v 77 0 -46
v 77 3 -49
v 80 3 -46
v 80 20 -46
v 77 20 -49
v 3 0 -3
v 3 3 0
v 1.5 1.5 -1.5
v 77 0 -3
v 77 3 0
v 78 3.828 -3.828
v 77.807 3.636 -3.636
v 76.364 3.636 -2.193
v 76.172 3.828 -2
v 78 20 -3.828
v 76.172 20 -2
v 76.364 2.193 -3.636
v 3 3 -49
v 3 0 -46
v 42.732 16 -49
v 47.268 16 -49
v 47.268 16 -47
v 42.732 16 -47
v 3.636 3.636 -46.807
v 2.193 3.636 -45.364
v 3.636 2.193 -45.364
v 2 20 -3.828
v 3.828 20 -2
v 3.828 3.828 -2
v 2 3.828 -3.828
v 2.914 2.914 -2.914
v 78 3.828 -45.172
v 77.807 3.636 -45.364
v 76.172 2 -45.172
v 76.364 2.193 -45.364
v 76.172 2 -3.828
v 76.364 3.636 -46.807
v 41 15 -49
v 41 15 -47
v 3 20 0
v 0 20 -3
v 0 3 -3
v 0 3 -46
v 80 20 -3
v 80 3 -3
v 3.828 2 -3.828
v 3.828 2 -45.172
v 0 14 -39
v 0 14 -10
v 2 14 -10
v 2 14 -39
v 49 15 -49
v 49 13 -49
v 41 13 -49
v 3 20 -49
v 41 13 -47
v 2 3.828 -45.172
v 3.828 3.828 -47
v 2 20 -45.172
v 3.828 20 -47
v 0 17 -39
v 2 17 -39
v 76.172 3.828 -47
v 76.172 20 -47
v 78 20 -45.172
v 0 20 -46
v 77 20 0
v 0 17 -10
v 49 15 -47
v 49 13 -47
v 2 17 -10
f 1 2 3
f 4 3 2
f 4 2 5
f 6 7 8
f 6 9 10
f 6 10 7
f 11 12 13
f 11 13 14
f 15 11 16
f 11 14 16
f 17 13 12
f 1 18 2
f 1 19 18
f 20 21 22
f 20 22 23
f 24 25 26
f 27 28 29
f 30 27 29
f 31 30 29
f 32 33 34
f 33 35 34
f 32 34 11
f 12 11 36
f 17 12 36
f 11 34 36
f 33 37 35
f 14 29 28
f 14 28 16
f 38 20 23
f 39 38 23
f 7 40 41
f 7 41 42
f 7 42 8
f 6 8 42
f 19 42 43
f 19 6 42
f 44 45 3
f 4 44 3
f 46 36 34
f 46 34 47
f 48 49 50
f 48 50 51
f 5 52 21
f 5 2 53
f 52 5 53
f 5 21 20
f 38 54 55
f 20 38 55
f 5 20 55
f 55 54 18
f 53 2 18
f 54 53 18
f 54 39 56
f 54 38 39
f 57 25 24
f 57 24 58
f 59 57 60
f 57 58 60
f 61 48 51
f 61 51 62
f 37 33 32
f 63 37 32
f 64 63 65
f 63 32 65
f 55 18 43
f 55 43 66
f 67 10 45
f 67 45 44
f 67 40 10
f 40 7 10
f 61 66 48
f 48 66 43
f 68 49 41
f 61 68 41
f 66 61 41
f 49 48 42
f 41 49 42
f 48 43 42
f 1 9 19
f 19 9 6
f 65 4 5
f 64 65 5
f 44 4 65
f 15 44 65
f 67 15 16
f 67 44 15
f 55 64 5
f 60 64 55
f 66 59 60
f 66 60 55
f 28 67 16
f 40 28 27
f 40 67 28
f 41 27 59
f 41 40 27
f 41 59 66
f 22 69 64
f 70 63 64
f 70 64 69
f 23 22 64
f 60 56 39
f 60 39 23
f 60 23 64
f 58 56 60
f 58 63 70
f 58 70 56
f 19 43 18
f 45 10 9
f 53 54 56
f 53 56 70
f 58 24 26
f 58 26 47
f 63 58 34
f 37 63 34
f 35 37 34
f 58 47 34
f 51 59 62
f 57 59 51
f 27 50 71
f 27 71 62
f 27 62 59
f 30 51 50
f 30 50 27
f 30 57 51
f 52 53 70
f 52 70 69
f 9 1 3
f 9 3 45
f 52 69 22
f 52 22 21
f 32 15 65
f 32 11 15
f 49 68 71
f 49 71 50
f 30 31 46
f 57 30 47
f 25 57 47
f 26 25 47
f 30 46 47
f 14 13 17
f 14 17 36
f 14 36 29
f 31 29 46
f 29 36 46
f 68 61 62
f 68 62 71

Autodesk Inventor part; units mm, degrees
ref_plane "YZ Plane" through (0, 0, 0) normal (1, 0, 0) x (0, 1, 0)
ref_plane "XZ Plane" through (0, 0, 0) normal (0, 1, 0) x (-1, 0, 0)
ref_plane "XY Plane" through (0, 0, 0) normal (0, 0, 1) x (1, 0, 0)
sketch "Náčrt1" plane through (0, 0, 0) normal (0, 1, 0) x (-1, 0, 0)
  line L0 (0, 0) -> (-80, 0)
  line L1 (-80, 0) -> (-80, -49)
  line L2 (-80, -49) -> (0, -49)
  line L3 (0, -49) -> (0, 0)
  dimension "d0" = 80
  dimension "d1" = 49
extrude "Vysunutí1" add sketch "Náčrt1" along normal blind 20
chamfer "Zkosení1" distance 3 angle 45 7 edges at (80, 10, 0) (40, 0, 0) (0, 0, -24.5) (0, 10, -49) (80, 10, -49) (40, 0, -49) (80, 0, -24.5)
chamfer "Zkosení2" distance 3 angle 45 1 edges at (0, 11.5, 0)
shell "Skořepina1" thickness 2 removed faces 1 at (27.6667, 20, -32.6667)
sketch "Náčrt2" plane through (0, 3, -46) normal (-1, 0, 0) x (0, 0, 1)
  line L0 (7, 14) -> (36, 14)
  line L1 (36, 14) -> (36, 11)
  line L2 (36, 11) -> (7, 11)
  line L3 (7, 11) -> (7, 14)
  line L4 (0, 0) -> (0, 17) projected
  line L5 (0, -3) -> (43, -3) projected
  line L6 (43, 0) -> (0, 0) projected
  line L7 (0, 17) -> (43, 17) projected
  point P0 (46, -3)
  dimension "d11" = 29
  dimension "d12" = 3
  dimension "d13" = 7
  dimension "d17" = 3
extrude "Vysunutí2" cut sketch "Náčrt2" against normal blind 2.5
sketch "Náčrt3" plane through (0, 14, -39) normal (0, 0, 1) x (1, 0, 0)
  point P0 (0, -14)
sketch "Náčrt4" plane through (77, 3, -49) normal (0, 0, -1) x (-1, 0, 0)
  line L0 (28, 13) -> (36, 13)
  line L1 (36, 13) -> (36, 10)
  line L2 (36, 10) -> (28, 10)
  line L3 (28, 10) -> (28, 13)
  line L4 (0, 0) -> (0, 17) projected
  line L5 (74, 0) -> (0, 0) projected
  line L6 (0, 17) -> (74, 17) projected
  point P0 (77, -3)
  dimension "d20" = 8
  dimension "d21" = 3
  dimension "d22" = 28
  dimension "d39" = 4
extrude "Vysunutí3" cut sketch "Náčrt4" against normal blind 2.5
chamfer "Zkosení3" distance 1 angle 60 1 edges at (49, 16, -48) measured on face at (49, 14, -48.3333)
chamfer "Zkosení4" distance 1 angle 60 1 edges at (41, 16, -48) measured on face at (41, 15, -48.3333)
sketch "Náčrt5" plane through (77, 3, 0) normal (0, 0, 1) x (1, 0, 0)
  point P0 (-77, -3)
sketch "Náčrt6" plane through (77, 3, -49) normal (0, 0, -1) x (-1, 0, 0)
  point P0 (77, -3)
sketch "Náčrt7" plane through (2, 3.8284, -3.8284) normal (1, 0, 0) x (0, 0, -1)
  point P0 (-3.8284, -3.8284)
properties part number "Base"
